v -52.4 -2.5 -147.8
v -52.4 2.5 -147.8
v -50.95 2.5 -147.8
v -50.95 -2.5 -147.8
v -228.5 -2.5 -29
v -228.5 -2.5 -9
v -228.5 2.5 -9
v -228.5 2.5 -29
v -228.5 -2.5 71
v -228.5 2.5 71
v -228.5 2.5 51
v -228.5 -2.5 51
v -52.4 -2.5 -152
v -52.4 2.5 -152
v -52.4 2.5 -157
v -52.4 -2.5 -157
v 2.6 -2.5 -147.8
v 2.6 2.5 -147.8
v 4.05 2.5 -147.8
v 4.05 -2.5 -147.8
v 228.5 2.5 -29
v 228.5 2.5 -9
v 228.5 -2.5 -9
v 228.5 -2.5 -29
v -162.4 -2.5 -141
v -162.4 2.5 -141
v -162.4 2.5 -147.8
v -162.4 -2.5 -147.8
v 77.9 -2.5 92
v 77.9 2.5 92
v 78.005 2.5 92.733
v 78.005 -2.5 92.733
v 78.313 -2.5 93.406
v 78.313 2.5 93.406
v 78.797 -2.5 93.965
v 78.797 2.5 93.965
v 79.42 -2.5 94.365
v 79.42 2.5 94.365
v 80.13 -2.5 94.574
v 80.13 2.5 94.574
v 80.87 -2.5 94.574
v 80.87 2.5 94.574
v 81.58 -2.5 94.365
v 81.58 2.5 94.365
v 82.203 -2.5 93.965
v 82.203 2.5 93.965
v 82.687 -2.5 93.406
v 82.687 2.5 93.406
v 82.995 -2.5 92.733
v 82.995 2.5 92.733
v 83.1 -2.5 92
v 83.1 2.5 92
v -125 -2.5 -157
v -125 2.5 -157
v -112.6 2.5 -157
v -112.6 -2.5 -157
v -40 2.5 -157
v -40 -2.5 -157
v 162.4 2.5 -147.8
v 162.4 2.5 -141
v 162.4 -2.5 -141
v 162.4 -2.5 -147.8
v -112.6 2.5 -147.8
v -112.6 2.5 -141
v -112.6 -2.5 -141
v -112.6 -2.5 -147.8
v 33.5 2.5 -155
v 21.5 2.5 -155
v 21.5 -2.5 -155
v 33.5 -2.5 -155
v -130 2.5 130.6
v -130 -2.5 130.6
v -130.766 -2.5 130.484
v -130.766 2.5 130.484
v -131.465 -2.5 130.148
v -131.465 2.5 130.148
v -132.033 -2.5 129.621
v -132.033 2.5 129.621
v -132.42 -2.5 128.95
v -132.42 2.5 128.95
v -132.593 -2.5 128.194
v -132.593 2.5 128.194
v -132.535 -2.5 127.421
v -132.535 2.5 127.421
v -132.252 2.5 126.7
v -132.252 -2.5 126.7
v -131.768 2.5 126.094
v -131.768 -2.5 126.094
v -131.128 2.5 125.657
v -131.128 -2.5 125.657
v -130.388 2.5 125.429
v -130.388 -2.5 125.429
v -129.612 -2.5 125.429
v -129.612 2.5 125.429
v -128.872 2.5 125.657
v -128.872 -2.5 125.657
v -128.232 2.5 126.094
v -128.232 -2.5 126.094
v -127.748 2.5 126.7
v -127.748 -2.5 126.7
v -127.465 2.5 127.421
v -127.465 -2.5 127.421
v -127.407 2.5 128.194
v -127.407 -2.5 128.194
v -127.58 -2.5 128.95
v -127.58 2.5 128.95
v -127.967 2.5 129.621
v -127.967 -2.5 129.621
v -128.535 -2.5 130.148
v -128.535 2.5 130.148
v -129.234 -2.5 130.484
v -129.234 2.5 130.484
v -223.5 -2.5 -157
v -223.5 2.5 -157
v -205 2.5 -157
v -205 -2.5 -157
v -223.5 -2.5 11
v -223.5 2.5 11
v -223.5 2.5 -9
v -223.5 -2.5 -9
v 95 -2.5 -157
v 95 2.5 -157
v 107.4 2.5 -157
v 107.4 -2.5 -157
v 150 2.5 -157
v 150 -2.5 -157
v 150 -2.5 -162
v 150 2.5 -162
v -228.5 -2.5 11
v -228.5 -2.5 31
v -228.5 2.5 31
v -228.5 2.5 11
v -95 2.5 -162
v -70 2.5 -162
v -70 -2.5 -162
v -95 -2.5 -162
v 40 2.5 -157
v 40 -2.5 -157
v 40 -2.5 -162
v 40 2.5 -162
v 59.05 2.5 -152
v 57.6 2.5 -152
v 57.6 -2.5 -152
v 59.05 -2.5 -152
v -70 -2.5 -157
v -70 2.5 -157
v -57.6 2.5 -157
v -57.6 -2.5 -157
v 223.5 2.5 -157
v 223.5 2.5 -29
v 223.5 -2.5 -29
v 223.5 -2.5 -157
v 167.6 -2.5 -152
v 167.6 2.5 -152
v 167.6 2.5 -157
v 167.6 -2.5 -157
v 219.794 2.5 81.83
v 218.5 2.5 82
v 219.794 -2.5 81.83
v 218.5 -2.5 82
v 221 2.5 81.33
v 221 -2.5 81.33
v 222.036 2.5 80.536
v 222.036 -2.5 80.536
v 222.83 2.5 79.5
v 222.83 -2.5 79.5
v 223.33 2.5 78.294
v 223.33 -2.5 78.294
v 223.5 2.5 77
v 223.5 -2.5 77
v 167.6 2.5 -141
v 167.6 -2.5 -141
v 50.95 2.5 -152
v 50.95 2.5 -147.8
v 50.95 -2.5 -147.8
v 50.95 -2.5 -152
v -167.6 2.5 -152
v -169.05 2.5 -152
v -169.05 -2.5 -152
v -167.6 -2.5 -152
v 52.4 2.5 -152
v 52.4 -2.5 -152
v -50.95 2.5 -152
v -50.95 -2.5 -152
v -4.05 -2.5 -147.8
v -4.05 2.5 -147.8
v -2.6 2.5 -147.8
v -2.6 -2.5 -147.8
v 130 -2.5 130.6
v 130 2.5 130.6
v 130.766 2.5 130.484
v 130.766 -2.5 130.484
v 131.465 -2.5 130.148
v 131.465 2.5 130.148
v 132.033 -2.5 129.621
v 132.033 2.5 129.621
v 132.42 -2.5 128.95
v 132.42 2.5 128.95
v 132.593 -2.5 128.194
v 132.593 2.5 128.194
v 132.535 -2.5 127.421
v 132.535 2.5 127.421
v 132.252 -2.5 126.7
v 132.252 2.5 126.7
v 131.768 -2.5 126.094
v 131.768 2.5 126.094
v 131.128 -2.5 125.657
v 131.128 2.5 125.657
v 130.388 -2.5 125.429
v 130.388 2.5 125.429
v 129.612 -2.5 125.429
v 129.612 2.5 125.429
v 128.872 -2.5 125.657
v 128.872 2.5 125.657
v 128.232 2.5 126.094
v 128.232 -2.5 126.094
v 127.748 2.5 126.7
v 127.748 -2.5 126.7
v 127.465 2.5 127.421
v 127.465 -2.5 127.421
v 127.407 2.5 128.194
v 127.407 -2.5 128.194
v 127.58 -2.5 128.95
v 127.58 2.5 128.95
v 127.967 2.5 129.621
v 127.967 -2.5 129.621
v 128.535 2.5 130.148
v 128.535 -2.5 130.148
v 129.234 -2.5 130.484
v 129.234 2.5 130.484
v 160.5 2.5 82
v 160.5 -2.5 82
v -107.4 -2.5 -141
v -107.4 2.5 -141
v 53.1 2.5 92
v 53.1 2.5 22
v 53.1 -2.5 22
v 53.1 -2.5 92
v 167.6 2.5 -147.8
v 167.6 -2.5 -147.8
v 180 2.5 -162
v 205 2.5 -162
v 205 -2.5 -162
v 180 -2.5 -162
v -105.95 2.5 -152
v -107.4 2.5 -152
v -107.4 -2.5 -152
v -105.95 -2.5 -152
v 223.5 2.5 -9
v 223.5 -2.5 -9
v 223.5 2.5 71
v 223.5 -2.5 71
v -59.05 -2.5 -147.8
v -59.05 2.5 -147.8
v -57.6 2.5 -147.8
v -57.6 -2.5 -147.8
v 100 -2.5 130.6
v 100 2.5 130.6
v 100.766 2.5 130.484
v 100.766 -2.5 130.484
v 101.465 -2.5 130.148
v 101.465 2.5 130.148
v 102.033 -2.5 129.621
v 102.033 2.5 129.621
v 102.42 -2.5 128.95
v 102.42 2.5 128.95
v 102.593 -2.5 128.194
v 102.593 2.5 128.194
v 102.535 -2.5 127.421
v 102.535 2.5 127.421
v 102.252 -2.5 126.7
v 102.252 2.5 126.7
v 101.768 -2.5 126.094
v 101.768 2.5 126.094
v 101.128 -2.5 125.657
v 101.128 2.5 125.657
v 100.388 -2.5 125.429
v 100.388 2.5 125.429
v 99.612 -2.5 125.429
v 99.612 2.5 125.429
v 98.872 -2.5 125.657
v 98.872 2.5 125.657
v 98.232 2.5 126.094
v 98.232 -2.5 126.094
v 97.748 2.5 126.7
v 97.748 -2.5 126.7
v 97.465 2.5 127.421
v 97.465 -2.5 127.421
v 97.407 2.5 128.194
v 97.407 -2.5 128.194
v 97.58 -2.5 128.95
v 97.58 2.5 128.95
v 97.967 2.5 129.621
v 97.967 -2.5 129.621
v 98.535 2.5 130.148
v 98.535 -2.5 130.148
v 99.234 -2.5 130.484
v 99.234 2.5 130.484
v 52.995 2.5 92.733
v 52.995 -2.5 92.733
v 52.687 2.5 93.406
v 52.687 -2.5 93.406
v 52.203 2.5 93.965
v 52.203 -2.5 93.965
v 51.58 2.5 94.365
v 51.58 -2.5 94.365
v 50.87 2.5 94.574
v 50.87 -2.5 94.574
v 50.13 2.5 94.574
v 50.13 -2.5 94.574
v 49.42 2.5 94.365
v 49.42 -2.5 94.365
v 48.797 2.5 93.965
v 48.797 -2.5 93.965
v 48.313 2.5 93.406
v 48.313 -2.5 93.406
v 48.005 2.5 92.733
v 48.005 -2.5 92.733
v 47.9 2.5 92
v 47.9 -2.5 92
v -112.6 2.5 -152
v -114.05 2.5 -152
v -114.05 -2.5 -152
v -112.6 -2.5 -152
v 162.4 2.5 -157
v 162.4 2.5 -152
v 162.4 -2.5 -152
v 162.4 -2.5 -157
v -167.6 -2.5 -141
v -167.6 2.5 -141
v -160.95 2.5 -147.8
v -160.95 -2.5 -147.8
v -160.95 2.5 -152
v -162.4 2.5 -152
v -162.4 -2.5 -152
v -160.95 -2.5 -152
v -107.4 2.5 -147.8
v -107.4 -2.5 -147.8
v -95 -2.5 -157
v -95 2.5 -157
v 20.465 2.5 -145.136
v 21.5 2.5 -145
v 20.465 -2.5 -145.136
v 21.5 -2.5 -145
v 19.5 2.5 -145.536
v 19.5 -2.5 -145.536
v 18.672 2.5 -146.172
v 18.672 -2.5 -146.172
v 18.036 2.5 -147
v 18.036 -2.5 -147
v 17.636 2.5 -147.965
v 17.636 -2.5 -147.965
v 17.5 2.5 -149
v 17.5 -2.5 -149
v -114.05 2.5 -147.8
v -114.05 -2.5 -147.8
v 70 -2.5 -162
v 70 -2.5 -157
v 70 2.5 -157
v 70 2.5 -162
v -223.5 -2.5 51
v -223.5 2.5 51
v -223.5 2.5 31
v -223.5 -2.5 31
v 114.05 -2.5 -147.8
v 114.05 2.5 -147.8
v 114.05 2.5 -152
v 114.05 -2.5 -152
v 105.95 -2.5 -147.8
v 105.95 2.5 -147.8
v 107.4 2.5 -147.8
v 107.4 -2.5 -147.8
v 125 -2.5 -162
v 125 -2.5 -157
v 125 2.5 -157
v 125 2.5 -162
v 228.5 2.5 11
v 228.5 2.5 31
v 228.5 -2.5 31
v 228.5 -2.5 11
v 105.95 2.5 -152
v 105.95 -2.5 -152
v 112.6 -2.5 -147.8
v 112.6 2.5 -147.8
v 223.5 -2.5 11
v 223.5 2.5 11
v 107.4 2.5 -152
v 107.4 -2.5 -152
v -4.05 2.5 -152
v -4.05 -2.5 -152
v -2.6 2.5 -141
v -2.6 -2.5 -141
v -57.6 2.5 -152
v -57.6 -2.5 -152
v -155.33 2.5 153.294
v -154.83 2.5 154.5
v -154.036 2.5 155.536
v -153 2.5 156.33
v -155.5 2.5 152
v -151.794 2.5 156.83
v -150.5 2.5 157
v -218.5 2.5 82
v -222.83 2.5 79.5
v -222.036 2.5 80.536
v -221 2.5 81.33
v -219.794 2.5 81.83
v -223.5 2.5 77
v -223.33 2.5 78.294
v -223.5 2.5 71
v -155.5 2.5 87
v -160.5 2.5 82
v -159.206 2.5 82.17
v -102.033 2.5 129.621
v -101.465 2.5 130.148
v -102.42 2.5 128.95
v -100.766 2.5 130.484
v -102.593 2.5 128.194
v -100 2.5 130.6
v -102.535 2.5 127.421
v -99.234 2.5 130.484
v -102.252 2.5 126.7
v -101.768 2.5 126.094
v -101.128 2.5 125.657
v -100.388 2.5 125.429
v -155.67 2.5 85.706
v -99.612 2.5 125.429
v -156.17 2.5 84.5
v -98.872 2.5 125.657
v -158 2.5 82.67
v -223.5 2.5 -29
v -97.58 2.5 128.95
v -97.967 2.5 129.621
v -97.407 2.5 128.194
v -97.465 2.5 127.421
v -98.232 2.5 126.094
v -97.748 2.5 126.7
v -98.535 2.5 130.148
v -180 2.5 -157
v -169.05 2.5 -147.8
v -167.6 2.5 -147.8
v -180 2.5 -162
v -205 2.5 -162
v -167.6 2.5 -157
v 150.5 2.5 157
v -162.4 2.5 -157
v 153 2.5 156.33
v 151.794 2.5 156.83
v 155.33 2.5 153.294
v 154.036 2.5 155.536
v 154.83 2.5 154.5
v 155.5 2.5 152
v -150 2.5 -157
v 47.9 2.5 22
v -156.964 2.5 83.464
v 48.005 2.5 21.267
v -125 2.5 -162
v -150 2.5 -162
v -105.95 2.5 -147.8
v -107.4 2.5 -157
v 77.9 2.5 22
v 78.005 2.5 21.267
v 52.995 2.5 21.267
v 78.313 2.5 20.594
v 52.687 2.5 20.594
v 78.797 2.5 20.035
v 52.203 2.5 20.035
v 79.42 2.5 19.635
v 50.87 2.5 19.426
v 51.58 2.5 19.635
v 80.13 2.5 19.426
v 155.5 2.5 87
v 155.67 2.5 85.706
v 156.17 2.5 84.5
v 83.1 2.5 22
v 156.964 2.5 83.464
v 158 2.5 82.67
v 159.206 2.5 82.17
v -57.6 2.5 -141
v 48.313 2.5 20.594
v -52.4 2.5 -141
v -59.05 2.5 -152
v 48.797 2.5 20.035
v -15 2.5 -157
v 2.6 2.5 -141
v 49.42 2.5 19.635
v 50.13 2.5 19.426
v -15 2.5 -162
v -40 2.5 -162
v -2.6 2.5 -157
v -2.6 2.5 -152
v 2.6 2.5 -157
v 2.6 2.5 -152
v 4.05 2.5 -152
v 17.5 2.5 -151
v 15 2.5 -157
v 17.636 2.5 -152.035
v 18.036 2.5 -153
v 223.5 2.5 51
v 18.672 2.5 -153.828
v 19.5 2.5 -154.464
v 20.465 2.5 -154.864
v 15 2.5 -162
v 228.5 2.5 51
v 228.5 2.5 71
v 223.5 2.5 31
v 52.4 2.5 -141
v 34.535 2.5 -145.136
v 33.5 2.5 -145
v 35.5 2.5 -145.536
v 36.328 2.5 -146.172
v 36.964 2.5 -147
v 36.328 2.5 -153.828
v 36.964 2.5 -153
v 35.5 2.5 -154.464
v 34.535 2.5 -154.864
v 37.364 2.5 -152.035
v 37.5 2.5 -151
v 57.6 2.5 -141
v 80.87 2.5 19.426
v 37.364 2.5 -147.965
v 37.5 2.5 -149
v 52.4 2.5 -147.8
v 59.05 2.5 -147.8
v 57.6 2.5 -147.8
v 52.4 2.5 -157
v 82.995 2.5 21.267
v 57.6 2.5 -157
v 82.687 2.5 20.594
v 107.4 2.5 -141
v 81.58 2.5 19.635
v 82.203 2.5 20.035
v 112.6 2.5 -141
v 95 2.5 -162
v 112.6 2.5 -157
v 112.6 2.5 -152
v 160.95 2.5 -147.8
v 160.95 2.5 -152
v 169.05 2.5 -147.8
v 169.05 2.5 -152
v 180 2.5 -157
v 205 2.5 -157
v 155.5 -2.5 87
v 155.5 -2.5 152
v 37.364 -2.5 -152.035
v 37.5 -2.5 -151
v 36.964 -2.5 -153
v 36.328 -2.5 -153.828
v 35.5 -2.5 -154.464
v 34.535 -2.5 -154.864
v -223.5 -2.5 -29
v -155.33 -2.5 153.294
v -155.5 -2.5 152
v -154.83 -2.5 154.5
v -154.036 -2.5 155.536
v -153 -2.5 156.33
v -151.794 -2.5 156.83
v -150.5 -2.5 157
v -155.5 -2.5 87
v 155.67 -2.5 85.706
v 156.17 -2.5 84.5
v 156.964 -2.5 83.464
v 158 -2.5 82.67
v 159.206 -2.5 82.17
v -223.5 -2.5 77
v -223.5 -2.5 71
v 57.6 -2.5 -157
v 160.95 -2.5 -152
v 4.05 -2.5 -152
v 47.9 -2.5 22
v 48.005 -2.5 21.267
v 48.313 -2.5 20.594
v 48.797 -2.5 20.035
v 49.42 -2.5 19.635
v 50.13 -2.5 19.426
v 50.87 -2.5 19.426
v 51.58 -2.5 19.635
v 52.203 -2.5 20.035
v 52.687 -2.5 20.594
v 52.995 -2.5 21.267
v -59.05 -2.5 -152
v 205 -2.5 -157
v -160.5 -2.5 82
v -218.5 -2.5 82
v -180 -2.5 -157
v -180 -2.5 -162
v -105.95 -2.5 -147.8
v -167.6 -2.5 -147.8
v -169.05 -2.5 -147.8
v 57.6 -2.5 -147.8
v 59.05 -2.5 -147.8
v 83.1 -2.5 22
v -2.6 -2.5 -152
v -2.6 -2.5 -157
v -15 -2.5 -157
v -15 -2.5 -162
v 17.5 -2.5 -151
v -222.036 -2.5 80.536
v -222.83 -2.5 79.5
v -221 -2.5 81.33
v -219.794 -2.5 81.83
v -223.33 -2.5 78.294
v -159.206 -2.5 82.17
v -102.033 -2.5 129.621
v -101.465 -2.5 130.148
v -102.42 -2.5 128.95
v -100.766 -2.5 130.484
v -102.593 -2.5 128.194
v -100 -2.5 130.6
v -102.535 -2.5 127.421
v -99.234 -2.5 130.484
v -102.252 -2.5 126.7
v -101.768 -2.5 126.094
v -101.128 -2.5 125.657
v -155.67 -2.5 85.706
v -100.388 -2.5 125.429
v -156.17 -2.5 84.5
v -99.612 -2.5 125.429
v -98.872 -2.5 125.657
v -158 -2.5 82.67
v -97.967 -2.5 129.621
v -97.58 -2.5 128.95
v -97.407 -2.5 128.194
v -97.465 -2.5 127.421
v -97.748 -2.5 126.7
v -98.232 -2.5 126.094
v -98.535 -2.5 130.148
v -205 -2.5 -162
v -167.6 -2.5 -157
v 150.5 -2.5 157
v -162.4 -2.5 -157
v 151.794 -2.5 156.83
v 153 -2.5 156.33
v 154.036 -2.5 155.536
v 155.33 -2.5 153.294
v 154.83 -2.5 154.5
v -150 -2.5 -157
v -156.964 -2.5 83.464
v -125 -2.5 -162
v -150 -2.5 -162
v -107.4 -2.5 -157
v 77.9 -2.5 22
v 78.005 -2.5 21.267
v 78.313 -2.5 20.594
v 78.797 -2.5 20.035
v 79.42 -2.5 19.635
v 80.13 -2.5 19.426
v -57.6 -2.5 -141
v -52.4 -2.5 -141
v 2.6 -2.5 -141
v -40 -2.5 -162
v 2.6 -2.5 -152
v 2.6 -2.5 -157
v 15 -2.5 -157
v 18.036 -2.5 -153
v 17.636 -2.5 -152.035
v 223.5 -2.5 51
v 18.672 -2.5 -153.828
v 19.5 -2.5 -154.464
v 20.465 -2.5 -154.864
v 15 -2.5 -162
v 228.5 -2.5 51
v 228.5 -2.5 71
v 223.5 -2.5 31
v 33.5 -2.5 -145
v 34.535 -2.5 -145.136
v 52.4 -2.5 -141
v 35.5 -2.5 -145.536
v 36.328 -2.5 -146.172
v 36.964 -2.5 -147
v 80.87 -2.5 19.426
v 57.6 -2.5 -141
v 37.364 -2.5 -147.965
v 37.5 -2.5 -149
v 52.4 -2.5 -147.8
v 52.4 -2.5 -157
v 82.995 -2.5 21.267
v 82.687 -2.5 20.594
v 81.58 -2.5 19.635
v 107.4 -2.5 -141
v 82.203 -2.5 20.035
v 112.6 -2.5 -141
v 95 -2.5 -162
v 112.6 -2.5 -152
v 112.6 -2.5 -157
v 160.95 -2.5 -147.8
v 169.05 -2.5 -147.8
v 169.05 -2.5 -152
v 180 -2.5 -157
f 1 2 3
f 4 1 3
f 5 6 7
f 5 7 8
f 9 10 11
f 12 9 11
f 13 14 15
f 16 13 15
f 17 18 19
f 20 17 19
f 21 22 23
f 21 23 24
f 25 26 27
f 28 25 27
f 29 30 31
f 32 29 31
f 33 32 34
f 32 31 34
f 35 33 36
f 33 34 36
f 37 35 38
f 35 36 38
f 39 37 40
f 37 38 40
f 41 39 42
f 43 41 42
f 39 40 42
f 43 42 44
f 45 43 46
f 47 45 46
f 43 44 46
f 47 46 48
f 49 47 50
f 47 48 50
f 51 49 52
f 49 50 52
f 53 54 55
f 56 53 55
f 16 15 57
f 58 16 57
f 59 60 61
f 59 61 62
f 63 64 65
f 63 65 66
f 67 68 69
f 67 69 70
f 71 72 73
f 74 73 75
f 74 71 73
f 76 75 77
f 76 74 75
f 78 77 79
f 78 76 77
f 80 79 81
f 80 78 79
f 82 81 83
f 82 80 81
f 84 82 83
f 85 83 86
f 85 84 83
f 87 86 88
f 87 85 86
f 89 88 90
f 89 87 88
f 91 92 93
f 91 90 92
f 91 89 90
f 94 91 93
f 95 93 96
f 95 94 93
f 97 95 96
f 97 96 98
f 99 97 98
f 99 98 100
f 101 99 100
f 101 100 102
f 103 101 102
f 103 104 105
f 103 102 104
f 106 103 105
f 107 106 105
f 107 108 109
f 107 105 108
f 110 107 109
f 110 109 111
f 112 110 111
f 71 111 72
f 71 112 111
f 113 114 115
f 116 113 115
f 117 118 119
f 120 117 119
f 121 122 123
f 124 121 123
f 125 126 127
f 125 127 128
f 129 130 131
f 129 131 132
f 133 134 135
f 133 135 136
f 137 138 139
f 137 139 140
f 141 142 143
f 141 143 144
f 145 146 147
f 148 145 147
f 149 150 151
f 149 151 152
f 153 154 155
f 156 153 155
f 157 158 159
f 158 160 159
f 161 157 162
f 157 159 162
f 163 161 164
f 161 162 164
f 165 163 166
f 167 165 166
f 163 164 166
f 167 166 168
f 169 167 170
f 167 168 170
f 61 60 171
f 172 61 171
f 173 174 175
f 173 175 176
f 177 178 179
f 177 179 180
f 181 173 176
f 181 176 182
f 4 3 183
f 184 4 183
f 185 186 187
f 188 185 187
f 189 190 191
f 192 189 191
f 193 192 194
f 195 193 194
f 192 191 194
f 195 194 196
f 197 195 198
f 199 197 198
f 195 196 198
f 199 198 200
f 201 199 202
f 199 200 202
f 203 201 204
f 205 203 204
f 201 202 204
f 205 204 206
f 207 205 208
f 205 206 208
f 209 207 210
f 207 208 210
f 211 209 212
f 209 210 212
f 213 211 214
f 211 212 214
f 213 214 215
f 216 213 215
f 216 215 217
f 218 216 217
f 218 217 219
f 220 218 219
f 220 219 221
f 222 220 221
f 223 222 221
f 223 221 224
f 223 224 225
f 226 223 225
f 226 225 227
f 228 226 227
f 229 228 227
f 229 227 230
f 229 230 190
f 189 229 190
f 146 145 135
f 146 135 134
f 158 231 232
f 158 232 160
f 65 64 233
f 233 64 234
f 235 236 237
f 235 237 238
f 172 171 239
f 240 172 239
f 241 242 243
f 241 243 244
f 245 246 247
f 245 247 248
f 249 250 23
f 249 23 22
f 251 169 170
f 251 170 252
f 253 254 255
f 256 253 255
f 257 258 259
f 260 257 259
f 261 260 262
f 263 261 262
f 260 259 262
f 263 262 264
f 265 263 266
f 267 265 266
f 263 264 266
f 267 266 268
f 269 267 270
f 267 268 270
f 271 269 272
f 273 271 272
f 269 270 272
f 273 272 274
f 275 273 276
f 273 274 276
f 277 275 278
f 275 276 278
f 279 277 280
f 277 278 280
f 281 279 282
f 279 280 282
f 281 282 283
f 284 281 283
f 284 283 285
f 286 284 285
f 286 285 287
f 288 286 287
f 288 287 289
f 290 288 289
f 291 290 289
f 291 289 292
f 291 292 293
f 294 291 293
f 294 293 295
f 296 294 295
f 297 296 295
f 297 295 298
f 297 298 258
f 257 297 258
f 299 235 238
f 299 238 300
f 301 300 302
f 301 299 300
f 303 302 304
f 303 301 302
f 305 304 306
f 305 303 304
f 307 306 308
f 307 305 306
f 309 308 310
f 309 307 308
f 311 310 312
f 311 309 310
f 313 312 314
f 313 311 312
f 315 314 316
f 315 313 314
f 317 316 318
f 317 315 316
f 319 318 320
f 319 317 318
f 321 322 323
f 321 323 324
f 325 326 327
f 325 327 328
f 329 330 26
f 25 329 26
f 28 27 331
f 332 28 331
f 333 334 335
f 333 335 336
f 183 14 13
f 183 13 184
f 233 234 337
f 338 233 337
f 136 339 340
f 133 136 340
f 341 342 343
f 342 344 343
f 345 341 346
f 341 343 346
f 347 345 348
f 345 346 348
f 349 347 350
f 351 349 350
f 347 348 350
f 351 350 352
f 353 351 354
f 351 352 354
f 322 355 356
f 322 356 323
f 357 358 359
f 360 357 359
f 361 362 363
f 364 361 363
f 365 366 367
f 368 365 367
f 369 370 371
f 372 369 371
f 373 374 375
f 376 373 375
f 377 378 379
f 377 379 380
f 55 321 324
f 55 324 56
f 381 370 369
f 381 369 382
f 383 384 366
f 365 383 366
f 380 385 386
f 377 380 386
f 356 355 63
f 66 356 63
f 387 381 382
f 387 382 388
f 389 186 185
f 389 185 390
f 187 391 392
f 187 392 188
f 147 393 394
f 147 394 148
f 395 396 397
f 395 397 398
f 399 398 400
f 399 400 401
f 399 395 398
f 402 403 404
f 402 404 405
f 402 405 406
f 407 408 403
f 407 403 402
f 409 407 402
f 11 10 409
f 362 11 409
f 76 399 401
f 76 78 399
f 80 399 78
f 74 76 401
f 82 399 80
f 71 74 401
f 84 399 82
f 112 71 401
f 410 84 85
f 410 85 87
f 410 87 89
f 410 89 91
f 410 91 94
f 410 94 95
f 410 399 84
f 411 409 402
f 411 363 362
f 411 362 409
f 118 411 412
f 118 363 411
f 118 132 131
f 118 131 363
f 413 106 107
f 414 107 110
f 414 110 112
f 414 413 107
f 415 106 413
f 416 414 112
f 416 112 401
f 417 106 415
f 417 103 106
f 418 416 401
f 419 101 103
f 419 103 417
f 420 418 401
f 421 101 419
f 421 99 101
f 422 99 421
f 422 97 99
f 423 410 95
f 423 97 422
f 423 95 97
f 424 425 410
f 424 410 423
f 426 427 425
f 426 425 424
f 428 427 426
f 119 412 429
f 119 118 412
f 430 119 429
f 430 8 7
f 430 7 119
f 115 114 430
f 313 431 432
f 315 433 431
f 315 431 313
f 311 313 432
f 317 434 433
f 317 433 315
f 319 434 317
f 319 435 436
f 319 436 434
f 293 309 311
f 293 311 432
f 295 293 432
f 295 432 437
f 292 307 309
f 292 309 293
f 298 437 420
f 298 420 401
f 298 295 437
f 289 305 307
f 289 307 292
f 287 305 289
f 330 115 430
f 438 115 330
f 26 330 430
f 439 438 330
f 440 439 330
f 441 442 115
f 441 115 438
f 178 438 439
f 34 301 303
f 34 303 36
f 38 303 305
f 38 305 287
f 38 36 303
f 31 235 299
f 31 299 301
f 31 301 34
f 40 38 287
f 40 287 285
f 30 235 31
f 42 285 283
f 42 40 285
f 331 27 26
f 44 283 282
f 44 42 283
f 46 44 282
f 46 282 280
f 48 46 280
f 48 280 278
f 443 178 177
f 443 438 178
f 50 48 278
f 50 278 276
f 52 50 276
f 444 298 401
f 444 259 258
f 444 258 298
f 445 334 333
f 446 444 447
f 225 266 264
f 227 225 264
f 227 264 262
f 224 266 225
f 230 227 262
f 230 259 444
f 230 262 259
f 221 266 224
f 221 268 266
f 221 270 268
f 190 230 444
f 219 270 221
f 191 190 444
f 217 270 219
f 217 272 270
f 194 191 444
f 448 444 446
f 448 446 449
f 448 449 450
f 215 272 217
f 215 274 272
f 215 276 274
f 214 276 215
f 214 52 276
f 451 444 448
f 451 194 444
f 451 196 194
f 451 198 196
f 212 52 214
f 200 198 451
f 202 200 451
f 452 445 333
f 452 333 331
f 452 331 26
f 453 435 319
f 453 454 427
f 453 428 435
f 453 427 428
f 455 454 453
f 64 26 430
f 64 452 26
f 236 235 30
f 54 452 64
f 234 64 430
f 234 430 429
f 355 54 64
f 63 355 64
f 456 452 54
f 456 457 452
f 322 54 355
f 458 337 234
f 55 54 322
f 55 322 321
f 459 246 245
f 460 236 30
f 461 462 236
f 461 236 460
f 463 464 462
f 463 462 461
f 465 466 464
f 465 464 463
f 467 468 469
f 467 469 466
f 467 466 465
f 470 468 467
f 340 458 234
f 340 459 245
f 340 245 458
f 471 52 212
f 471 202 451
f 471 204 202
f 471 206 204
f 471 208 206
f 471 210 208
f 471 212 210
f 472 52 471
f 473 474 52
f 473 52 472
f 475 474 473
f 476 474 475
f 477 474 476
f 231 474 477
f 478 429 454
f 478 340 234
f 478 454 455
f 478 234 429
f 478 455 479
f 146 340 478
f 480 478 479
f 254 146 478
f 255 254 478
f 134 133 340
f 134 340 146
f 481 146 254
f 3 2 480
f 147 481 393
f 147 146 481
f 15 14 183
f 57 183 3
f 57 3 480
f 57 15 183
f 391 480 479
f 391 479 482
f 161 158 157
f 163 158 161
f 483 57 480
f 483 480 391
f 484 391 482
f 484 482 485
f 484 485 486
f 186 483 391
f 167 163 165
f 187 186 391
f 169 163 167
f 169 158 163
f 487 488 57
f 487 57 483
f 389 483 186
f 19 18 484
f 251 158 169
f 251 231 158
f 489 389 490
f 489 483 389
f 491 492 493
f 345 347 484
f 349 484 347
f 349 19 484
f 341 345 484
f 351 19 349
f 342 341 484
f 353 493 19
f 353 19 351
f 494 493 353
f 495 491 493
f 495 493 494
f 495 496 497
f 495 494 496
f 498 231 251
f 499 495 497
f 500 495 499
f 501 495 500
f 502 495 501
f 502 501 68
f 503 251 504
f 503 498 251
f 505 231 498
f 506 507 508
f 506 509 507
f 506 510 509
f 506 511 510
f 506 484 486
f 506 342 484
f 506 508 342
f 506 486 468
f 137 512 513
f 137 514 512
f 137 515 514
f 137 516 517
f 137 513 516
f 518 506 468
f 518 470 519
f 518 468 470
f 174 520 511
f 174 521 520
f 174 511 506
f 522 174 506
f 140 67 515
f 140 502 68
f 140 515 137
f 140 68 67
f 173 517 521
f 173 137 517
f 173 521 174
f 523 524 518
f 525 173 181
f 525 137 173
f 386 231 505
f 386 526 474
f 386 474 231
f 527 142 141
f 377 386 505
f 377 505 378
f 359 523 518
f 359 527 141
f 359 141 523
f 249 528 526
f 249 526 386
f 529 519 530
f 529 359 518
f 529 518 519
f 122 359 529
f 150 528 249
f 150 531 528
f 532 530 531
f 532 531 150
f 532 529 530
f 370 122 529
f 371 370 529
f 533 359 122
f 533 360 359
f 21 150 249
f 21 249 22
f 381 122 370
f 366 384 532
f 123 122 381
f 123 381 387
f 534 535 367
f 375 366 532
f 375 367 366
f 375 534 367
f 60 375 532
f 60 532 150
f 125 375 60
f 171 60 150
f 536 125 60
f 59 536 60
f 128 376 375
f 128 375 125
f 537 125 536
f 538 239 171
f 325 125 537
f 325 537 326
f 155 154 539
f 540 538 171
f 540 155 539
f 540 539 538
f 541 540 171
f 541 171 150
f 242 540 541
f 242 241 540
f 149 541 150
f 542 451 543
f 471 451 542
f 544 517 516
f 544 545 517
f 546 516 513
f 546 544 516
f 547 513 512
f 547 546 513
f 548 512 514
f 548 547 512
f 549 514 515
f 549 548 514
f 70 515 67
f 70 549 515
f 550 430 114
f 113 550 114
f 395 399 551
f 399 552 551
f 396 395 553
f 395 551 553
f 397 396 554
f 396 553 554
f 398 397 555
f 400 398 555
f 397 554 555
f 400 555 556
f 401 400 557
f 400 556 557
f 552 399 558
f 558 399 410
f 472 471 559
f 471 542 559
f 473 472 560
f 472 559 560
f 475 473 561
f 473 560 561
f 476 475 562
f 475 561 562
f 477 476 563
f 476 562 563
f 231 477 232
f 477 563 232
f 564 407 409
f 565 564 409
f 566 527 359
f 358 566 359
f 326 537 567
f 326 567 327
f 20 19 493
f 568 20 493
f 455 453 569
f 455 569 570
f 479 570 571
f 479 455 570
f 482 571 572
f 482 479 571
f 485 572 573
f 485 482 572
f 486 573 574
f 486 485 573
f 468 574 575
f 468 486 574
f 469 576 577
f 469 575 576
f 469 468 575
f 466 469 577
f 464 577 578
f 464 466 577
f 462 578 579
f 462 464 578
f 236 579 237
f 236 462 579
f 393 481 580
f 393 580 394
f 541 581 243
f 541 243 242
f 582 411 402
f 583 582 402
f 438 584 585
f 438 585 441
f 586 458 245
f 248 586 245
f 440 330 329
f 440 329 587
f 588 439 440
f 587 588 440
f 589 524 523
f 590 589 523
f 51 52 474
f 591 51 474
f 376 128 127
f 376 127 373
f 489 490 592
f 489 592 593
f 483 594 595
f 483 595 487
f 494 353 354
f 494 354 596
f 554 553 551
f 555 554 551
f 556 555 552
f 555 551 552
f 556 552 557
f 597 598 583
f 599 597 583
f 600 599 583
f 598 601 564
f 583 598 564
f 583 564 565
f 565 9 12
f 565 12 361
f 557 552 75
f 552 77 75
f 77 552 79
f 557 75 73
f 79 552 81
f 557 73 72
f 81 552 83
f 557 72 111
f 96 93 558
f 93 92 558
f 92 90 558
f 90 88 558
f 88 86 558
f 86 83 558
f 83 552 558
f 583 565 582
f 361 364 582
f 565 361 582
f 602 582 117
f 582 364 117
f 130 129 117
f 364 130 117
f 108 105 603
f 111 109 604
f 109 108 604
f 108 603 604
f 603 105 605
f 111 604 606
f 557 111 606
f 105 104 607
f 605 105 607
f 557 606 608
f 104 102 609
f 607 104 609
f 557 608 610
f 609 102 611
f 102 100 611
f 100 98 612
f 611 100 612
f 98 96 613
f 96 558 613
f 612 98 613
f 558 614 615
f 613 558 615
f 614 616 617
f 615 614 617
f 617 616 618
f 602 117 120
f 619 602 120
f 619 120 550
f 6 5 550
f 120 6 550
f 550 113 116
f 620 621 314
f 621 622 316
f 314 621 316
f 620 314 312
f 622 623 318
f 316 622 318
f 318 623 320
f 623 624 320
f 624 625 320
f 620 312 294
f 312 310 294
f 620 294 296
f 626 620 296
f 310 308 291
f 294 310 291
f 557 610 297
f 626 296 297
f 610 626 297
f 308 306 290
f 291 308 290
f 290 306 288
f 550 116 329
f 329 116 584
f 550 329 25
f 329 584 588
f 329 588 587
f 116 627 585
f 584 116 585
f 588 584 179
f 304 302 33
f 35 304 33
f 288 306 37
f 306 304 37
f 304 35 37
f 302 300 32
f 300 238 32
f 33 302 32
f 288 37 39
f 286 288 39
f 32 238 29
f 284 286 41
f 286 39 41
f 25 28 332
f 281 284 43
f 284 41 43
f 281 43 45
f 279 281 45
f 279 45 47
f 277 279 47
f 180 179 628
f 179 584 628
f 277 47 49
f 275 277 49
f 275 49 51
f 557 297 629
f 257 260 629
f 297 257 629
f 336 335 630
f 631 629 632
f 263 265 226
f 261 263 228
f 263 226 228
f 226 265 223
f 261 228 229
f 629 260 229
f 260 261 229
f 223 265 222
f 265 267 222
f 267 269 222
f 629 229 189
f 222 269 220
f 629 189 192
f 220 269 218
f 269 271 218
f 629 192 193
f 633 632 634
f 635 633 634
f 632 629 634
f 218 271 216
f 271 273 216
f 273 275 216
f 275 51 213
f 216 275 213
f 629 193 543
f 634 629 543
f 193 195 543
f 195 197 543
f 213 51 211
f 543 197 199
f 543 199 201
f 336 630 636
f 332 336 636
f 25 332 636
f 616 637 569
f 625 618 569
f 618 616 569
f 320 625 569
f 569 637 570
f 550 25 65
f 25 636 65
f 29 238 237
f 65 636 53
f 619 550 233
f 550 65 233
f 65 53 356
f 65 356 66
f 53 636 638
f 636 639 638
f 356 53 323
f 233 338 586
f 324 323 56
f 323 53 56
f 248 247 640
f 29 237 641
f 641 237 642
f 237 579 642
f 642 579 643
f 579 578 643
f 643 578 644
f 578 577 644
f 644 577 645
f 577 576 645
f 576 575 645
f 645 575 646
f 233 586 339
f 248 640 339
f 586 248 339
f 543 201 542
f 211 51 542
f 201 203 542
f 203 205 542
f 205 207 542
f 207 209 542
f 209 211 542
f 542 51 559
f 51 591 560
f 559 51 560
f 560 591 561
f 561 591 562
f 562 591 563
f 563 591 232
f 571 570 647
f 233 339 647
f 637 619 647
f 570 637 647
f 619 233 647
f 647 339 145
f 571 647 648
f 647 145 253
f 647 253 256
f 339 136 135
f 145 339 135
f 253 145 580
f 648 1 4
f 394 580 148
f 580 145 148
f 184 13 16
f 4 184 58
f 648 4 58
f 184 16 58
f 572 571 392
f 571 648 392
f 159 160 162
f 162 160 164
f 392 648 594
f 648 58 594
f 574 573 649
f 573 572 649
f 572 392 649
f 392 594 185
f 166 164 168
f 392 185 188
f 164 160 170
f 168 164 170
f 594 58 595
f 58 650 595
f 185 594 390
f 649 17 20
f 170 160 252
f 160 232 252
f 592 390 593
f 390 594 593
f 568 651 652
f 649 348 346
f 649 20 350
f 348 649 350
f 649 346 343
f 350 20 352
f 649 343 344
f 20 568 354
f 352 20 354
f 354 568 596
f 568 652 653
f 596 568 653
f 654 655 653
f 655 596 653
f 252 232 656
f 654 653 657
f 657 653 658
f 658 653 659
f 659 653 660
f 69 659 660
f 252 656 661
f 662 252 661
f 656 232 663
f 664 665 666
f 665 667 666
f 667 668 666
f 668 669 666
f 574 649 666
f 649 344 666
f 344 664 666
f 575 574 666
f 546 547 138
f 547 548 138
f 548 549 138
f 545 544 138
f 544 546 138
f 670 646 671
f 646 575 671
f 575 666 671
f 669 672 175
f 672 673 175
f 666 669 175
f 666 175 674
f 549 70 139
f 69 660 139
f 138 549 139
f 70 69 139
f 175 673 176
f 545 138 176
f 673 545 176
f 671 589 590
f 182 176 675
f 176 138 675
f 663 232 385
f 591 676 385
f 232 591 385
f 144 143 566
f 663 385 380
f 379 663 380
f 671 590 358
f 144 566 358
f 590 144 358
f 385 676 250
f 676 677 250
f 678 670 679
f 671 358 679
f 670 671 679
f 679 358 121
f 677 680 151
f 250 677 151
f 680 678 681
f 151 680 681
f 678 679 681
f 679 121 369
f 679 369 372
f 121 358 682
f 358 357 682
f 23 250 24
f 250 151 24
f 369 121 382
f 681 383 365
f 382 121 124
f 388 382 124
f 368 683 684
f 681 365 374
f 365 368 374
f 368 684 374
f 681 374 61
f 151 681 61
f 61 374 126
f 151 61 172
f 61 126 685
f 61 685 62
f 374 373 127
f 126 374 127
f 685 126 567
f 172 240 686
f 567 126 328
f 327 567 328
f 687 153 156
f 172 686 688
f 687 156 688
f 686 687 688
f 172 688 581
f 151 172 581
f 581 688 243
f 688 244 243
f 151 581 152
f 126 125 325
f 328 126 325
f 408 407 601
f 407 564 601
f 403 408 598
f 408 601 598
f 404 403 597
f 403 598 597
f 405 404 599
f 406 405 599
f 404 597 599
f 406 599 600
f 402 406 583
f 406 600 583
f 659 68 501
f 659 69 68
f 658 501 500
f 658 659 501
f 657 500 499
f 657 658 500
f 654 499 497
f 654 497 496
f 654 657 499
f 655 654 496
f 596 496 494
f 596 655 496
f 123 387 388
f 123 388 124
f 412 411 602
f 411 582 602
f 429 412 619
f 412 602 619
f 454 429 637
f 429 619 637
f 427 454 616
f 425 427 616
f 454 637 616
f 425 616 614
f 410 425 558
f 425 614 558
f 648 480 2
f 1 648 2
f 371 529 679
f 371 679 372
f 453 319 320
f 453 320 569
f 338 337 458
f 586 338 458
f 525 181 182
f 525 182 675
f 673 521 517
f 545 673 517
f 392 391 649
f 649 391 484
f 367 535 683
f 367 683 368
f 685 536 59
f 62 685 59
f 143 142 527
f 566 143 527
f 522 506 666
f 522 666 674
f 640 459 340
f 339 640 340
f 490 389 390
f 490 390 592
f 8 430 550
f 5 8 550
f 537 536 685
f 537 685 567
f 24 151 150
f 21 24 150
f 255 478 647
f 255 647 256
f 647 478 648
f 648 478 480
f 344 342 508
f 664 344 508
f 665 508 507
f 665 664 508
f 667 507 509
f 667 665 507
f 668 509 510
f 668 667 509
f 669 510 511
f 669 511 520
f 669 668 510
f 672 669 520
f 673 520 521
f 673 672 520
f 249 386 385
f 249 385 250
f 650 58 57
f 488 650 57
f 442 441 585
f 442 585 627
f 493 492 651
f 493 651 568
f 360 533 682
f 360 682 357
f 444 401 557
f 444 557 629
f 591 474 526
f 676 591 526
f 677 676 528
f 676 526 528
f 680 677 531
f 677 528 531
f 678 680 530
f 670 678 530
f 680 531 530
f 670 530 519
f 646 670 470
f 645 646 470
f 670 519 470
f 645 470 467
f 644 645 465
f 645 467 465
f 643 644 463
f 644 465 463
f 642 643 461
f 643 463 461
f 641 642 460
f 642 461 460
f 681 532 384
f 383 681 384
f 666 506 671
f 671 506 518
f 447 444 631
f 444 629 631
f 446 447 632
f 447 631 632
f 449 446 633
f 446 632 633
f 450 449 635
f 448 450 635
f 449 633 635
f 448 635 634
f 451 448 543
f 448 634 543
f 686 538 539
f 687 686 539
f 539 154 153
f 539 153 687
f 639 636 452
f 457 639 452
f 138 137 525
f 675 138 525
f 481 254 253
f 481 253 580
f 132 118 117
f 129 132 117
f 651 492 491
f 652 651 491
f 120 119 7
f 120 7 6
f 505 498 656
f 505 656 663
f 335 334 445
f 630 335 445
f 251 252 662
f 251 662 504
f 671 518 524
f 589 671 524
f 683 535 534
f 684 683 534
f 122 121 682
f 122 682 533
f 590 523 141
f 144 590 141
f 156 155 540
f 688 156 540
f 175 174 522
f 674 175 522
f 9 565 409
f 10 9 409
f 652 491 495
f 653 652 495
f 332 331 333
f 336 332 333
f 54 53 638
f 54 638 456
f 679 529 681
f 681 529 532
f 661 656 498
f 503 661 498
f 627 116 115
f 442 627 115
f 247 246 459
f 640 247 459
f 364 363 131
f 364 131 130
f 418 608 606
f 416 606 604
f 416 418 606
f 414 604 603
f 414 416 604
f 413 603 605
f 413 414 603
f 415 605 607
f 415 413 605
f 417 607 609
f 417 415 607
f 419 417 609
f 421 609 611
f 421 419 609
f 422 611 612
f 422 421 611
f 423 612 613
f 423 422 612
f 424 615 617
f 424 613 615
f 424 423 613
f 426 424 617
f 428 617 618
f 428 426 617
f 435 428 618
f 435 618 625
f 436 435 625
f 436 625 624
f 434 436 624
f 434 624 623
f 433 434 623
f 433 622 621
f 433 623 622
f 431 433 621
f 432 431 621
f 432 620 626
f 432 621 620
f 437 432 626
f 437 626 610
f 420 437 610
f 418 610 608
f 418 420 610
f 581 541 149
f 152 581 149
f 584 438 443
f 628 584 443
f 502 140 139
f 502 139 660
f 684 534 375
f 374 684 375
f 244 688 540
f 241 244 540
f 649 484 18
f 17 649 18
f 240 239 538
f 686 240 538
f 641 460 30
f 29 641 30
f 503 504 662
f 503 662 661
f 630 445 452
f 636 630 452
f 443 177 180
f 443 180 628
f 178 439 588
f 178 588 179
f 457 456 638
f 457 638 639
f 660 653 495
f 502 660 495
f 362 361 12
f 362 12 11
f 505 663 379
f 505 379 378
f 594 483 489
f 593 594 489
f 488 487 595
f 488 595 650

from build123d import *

# Parameters (mm, degrees)
ESBO_O1_W                 = 447
ESBO_O1_H                 = 314
RESSALTO_EXTRUS_O1_DEPTH  = 2.5
ESBO_O2_W                 = 25
ESBO_O2_H                 = 5
RESSALTO_EXTRUS_O2_DEPTH  = 5
PADR_O_LINEAR1_COUNT      = 8
PADR_O_LINEAR1_PITCH      = 55
ESBO_O3_W                 = 5.2
ESBO_O3_H                 = 5
ESBO_O3_W_2               = 8.1
ESBO_O3_H_2               = 4.2
ESBO_O3_H_3               = 6.8
CORTE_EXTRUS_O1_DEPTH     = 277.081962468
PADR_O_LINEAR2_COUNT      = 7
PADR_O_LINEAR2_PITCH      = 55
ESBO_O7_W                 = 68
ESBO_O7_H                 = 75
CORTE_EXTRUS_O2_DEPTH     = 10
ESBO_O8_R                 = 2.6
CORTE_EXTRUS_O3_DEPTH     = 277.081962468
FILETE1_R                 = 5
ESBO_O9_W                 = 20
ESBO_O9_H                 = 5
RESSALTO_EXTRUS_O3_DEPTH  = 5
PADR_O_LINEAR3_COUNT      = 3
PADR_O_LINEAR3_PITCH      = 40
ESPELHAR3_COPY_1_SKETCH_W = 20
ESPELHAR3_COPY_1_SKETCH_H = 5
ESPELHAR3_COPY_1_DEPTH    = 5
ESPELHAR3_COPY_2_SKETCH_W = 20
ESPELHAR3_COPY_2_SKETCH_H = 5
ESPELHAR3_COPY_2_DEPTH    = 5
CORTE_EXTRUS_O6_DEPTH     = 281.145051714
ESBO_O17_W                = 20
ESBO_O17_H                = 10
CORTE_EXTRUS_O10_DEPTH    = 281.145051714
FILETE2_R                 = 4


with BuildPart() as part:
    # Esboço1 → Ressalto-extrusão1 (new, symmetric)
    with BuildSketch(Plane(origin=(0, 0, 0), x_dir=(1, 0, 0), z_dir=(0, 1, 0))):
        Rectangle(ESBO_O1_W, ESBO_O1_H)
    extrude(amount=RESSALTO_EXTRUS_O1_DEPTH, both=True)

    # Esboço2 → Ressalto-extrusão2 (add)
    with BuildSketch(Plane(origin=(0, 0, -157), x_dir=(-1, 0, 0), z_dir=(0, 0, -1))):
        with Locations((-192.5, 0)):
            Rectangle(ESBO_O2_W, ESBO_O2_H)
    ressalto_extrus_o2 = extrude(amount=RESSALTO_EXTRUS_O2_DEPTH)

    # Padrão linear1: Ressalto-extrusão2 ×8
    with Locations(*[(-i * PADR_O_LINEAR1_PITCH, 0, 0) for i in range(1, PADR_O_LINEAR1_COUNT)]):
        add(ressalto_extrus_o2)

    # Esboço3 → Corte-extrusão1 (cut, through all)
    with BuildSketch(Plane(origin=(0, 2.5, 0), x_dir=(1, 0, 0), z_dir=(0, 1, 0))):
        with Locations((165, 154.5)):
            Rectangle(ESBO_O3_W, ESBO_O3_H)
        with Locations((165, 149.9)):
            Rectangle(ESBO_O3_W_2, ESBO_O3_H_2)
        with Locations((165, 144.4)):
            Rectangle(ESBO_O3_W, ESBO_O3_H_3)
    corte_extrus_o1 = extrude(amount=-CORTE_EXTRUS_O1_DEPTH, mode=Mode.SUBTRACT)

    # Padrão linear2: Corte-extrusão1 ×7
    with Locations(*[(-i * PADR_O_LINEAR2_PITCH, 0, 0) for i in range(1, PADR_O_LINEAR2_COUNT)]):
        add(corte_extrus_o1, mode=Mode.SUBTRACT)

    # Esboço7 → Corte-extrusão2 (cut)
    with BuildSketch(Plane(origin=(0, 2.5, 0), x_dir=(1, 0, 0), z_dir=(0, 1, 0))):
        with Locations((189.5, -119.5)):
            Rectangle(ESBO_O7_W, ESBO_O7_H)
    corte_extrus_o2 = extrude(amount=-CORTE_EXTRUS_O2_DEPTH, mode=Mode.SUBTRACT)

    # Esboço8 → Corte-extrusão3 (cut, through all)
    with BuildSketch(Plane(origin=(0, 2.5, 0), x_dir=(1, 0, 0), z_dir=(0, 1, 0))):
        with Locations(Location((130, -128, 0), (0, 0, 270))):
            Circle(ESBO_O8_R)
        with Locations(Location((100, -128, 0), (0, 0, 270))):
            Circle(ESBO_O8_R)
    corte_extrus_o3 = extrude(amount=-CORTE_EXTRUS_O3_DEPTH, mode=Mode.SUBTRACT)

    # Espelhar2: Corte-extrusão2, Corte-extrusão3 across plane
    add(corte_extrus_o2.mirror(Plane(origin=(0, 0, 0), x_dir=(0, 0, 1), z_dir=(1, 0, 0))), mode=Mode.SUBTRACT)
    add(corte_extrus_o3.mirror(Plane(origin=(0, 0, 0), x_dir=(0, 0, 1), z_dir=(1, 0, 0))), mode=Mode.SUBTRACT)

    # Filete1
    filete1_edges = [part.edges().sort_by_distance(p)[0] for p in [
        (223.5, 0, 82),
        (155.5, 0, 157),
        (155.5, 0, 82),
        (-223.5, 0, 82),
        (-155.5, 0, 82),
        (-155.5, 0, 157),
    ]]
    fillet(filete1_edges, radius=FILETE1_R)

    # Esboço9 → Ressalto-extrusão3 (add)
    with BuildSketch(Plane(origin=(223.5, 0, 0), x_dir=(0, 0, -1), z_dir=(1, 0, 0))):
        with Locations((-61, 0)):
            Rectangle(ESBO_O9_W, ESBO_O9_H)
    ressalto_extrus_o3 = extrude(amount=RESSALTO_EXTRUS_O3_DEPTH)

    # Padrão linear3: Ressalto-extrusão3 ×3
    with Locations(*[(0, 0, -i * PADR_O_LINEAR3_PITCH) for i in range(1, PADR_O_LINEAR3_COUNT)]):
        add(ressalto_extrus_o3)

    # Espelhar3: Ressalto-extrusão3 across plane
    add(ressalto_extrus_o3.mirror(Plane(origin=(0, 0, 0), x_dir=(0, 0, 1), z_dir=(1, 0, 0))))

    # Espelhar3 copy 1 sketch → Espelhar3 copy 1 (add)
    with BuildSketch(Plane(origin=(-223.5, 0, -40), x_dir=(0, 0, -1), z_dir=(-1, 0, 0))):
        with Locations((-61, 0)):
            Rectangle(ESPELHAR3_COPY_1_SKETCH_W, ESPELHAR3_COPY_1_SKETCH_H)
    extrude(amount=ESPELHAR3_COPY_1_DEPTH)

    # Espelhar3 copy 2 sketch → Espelhar3 copy 2 (add)
    with BuildSketch(Plane(origin=(-223.5, 0, -80), x_dir=(0, 0, -1), z_dir=(-1, 0, 0))):
        with Locations((-61, 0)):
            Rectangle(ESPELHAR3_COPY_2_SKETCH_W, ESPELHAR3_COPY_2_SKETCH_H)
    extrude(amount=ESPELHAR3_COPY_2_DEPTH)

    # Esboço12 → Corte-extrusão6 (cut, through all)
    with BuildSketch(Plane(origin=(0, 2.5, 0), x_dir=(1, 0, 0), z_dir=(0, 1, 0))):
        with BuildLine():
            Line((53.1, -22), (53.1, -92))
            ThreePointArc((53.1, -92), (50.5, -94.6), (47.9, -92))
            Line((47.9, -92), (47.9, -22))
            ThreePointArc((47.9, -22), (50.5, -19.4), (53.1, -22))
        make_face()
        with BuildLine():
            Line((77.9, -22), (77.9, -92))
            ThreePointArc((77.9, -92), (80.5, -94.6), (83.1, -92))
            Line((83.1, -92), (83.1, -22))
            ThreePointArc((83.1, -22), (80.5, -19.4), (77.9, -22))
        make_face()
    extrude(amount=-CORTE_EXTRUS_O6_DEPTH, mode=Mode.SUBTRACT)

    # Esboço17 → Corte-extrusão10 (cut, through all)
    with BuildSketch(Plane(origin=(0, 2.5, 0), x_dir=(1, 0, 0), z_dir=(0, 1, 0))):
        with Locations((27.5, 150)):
            Rectangle(ESBO_O17_W, ESBO_O17_H)
    extrude(amount=-CORTE_EXTRUS_O10_DEPTH, mode=Mode.SUBTRACT)

    # Filete2
    filete2_edges = [part.edges().sort_by_distance(p)[0] for p in [
        (37.5, 0, -155),
        (37.5, 0, -145),
        (17.5, 0, -145),
        (17.5, 0, -155),
    ]]
    fillet(filete2_edges, radius=FILETE2_R)


solid = part.part
